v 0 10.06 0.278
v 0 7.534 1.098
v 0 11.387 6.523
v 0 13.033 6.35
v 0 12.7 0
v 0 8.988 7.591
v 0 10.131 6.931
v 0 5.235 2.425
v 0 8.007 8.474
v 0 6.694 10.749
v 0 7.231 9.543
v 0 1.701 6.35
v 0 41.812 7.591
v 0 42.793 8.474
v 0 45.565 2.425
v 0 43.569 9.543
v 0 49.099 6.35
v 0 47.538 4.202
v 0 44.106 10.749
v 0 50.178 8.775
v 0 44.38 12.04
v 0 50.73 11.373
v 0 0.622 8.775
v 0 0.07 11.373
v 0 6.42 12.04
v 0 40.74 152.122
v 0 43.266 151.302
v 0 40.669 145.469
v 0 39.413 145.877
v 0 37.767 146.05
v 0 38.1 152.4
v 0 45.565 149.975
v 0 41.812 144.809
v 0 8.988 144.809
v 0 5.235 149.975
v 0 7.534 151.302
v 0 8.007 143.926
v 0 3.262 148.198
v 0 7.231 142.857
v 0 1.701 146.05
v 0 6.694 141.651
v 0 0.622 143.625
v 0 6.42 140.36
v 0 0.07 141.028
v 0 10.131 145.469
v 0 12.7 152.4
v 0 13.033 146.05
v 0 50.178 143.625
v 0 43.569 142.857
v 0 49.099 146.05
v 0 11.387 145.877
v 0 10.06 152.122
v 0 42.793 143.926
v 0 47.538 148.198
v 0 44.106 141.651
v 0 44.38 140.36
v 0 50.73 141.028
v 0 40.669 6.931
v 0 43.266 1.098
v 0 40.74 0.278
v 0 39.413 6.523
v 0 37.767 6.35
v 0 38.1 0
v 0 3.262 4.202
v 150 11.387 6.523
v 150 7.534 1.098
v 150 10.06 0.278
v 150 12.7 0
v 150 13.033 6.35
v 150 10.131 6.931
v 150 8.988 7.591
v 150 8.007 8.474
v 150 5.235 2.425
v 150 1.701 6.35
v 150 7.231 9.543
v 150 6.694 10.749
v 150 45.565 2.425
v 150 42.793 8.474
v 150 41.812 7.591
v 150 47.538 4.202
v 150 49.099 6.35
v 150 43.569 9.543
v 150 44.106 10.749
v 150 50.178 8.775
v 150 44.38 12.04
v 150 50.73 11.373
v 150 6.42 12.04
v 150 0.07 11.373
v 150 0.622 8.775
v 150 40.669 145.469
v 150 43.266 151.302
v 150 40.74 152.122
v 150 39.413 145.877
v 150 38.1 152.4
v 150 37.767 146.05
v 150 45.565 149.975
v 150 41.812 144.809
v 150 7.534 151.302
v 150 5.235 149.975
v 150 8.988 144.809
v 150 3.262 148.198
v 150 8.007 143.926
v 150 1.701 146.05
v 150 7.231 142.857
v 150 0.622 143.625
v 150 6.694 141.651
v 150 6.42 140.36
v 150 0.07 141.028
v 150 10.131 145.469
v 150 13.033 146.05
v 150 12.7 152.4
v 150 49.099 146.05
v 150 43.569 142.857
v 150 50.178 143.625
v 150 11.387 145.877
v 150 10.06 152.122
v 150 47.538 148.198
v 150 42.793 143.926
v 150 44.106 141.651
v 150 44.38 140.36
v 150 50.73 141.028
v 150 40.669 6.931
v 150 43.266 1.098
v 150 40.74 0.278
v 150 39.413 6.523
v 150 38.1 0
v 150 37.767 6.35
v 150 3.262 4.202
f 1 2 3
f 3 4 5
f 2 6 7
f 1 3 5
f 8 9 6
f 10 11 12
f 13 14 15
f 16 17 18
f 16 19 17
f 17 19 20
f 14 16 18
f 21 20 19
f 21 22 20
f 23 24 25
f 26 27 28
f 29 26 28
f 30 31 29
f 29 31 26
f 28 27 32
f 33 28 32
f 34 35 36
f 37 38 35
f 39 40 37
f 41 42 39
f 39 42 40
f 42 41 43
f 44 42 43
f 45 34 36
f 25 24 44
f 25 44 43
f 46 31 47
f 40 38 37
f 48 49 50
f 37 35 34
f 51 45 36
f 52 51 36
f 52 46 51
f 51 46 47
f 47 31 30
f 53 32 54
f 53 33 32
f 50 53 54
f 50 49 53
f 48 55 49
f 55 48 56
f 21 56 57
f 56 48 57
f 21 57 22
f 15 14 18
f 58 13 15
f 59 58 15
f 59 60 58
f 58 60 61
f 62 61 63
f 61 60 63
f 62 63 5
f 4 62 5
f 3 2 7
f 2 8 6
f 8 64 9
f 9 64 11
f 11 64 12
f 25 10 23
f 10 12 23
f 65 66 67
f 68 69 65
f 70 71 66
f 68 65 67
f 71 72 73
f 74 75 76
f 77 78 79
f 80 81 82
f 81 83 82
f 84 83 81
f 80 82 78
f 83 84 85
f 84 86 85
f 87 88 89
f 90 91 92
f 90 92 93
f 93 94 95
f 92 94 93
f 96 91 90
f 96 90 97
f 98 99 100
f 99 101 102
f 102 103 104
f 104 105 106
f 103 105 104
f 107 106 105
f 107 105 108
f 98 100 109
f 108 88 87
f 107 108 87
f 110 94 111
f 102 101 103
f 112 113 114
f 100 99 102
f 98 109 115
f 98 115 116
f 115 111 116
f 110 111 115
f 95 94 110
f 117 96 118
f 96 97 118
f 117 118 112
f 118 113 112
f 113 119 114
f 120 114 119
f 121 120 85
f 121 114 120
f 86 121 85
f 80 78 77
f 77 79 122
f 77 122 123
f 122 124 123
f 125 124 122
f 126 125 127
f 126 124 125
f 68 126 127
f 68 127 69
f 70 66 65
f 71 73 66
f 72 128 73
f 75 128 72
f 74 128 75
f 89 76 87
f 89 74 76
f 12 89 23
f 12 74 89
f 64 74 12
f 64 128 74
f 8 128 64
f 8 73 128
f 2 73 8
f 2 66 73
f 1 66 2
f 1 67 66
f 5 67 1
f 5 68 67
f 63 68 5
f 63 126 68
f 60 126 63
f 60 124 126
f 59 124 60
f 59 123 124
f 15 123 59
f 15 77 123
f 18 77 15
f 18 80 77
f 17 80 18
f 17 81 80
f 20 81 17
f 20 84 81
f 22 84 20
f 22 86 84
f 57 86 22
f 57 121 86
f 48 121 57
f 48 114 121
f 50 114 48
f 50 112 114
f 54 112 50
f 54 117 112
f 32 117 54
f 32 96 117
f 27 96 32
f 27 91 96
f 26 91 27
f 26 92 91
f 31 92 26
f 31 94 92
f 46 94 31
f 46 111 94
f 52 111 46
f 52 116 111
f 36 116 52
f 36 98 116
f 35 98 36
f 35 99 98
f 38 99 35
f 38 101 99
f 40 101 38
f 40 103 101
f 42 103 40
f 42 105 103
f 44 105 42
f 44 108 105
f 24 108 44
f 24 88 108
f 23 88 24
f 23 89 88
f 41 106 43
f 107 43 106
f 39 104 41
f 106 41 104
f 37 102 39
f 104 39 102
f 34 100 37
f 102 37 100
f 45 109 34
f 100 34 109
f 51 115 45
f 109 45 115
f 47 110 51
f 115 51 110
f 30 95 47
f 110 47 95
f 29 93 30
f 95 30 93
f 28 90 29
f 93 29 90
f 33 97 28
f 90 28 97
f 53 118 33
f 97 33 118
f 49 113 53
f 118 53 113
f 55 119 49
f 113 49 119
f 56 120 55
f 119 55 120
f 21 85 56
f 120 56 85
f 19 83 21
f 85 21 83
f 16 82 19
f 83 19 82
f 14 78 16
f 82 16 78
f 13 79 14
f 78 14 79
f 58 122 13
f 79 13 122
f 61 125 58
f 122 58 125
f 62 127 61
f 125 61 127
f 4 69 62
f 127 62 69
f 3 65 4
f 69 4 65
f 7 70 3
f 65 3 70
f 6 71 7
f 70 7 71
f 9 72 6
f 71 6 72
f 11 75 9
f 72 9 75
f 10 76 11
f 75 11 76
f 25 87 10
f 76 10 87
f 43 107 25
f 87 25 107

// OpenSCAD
// Part T5: Arm Leg Spacer Tube
// Material: 2"×6"×1/4" Rectangular Tubing (50.8mm × 152.4mm × 6.35mm wall)
// Quantity: 2 pieces (1 left, 1 right)
// Location: Elbow section between main arm tube and bucket pivot
//
// This piece is tapered/cut to match the arm plate profile
// Full length before cutting: ~150mm
// Positioned at elbow angle (ARM_ANGLE, typically ~150 degrees)

include <../../lifetrac_v25_params.scad>

// =============================================================================
// PART DIMENSIONS (Pre-cut stock length)
// =============================================================================

_tube_w = is_undef(TUBE_2X6_1_4) ? 152.4 : TUBE_2X6_1_4[0];  // 6 inches
_tube_h = is_undef(TUBE_2X6_1_4) ? 50.8 : TUBE_2X6_1_4[1];   // 2 inches
_wall_thick = 6.35;
_tube_rad = 12.7;

// Spacer length before tapering
PART_T5_LENGTH_STOCK = 150;  // 150mm stock length
PART_T5_WIDTH = _tube_w;
PART_T5_HEIGHT = _tube_h;
PART_T5_WALL = _wall_thick;
PART_T5_RADIUS = _tube_rad;

// Taper parameters from arm geometry
_drop_len = is_undef(ARM_DROP_LEN) ? 300 : ARM_DROP_LEN;
_drop_ext = is_undef(ARM_DROP_EXT) ? 80 : ARM_DROP_EXT;
_pivot_hole_x = is_undef(PIVOT_HOLE_X_FROM_FRONT) ? 25.4 : PIVOT_HOLE_X_FROM_FRONT;
_pivot_hole_z = is_undef(PIVOT_HOLE_Z_FROM_BOTTOM) ? 127 : PIVOT_HOLE_Z_FROM_BOTTOM;

_plate_cx = _drop_ext - _pivot_hole_x;
_boss_x = _drop_len + _plate_cx;
_boss_z = _pivot_hole_z;
_boss_r = _pivot_hole_x;
_cut_start_x = _drop_len - 100;

_bolt_dia = is_undef(BOLT_DIA_1_2) ? 12.7 : BOLT_DIA_1_2;

// =============================================================================
// MAIN MODULE
// =============================================================================

/**
 * Part T5: Arm Leg Spacer Tube (Raw Stock)
 * This shows the uncut stock piece.
 * In fabrication, this will be plasma cut to match arm plate profile.
 * show_profile: if true, shows the cut profile envelope
 */
module _part_t5_arm_leg_spacer_raw() {
    spacer_len = PART_T5_LENGTH_STOCK;
    tube_w = PART_T5_WIDTH;
    tube_h = PART_T5_HEIGHT;
    wall = PART_T5_WALL;
    rad = PART_T5_RADIUS;
    
    color("DarkGray")
    translate([0, 0, tube_h])
    rotate([0, 90, 0])
    linear_extrude(height=spacer_len)
    difference() {
        // Outer profile
        hull() {
            translate([rad, rad]) circle(r=rad);
            translate([tube_h - rad, rad]) circle(r=rad);
            translate([tube_h - rad, tube_w - rad]) circle(r=rad);
            translate([rad, tube_w - rad]) circle(r=rad);
        }
        // Inner cutout
        offset(delta=-wall)
        hull() {
            translate([rad, rad]) circle(r=rad);
            translate([tube_h - rad, rad]) circle(r=rad);
            translate([tube_h - rad, tube_w - rad]) circle(r=rad);
            translate([rad, tube_w - rad]) circle(r=rad);
        }
    }
}

/**
 * Part T5: Arm Leg Spacer Tube (Cut to Profile)
 * Shows the final tapered shape matching arm plate
 * show_holes: if true, renders mounting holes
 */
module _part_t5_arm_leg_spacer_cut(show_holes=true) {
    spacer_len = PART_T5_LENGTH_STOCK;
    tube_w = PART_T5_WIDTH;
    tube_h = PART_T5_HEIGHT;
    wall = PART_T5_WALL;
    rad = PART_T5_RADIUS;
    
    color("DarkGray")
    difference() {
        intersection() {
            // Raw tube section
            translate([0, 0, tube_h])
            rotate([0, 90, 0])
            linear_extrude(height=spacer_len)
            difference() {
                offset(r=rad) square([tube_h - rad*2, tube_w - rad*2], center=true);
                hull() {
                    translate([-tube_h/2 + rad, -tube_w/2 + rad]) circle(r=rad);
                    translate([tube_h/2 - rad, -tube_w/2 + rad]) circle(r=rad);
                    translate([tube_h/2 - rad, tube_w/2 - rad]) circle(r=rad);
                    translate([-tube_h/2 + rad, tube_w/2 - rad]) circle(r=rad);
                }
            }
            
            // Profile envelope (tapers toward pivot)
            union() {
                // Full width portion
                cube([_cut_start_x, 100 + tube_w, tube_h]);
                // Taper portion
                hull() {
                    translate([_cut_start_x - 1, -50, 0])
                    cube([1, 100 + tube_w, tube_h]);
                    translate([_boss_x, -50, _boss_z])
                    rotate([-90, 0, 0])
                    cylinder(r=_boss_r, h=100 + tube_w);
                }
            }
        }
        
        // Mounting holes (4 bolts)
        if (show_holes) {
            for (xb = [spacer_len/3, spacer_len*2/3])
                for (zb = [tube_h*0.3, tube_h*0.7])
                    translate([xb, tube_w/2, zb])
                    rotate([90, 0, 0])
                    cylinder(d=_bolt_dia, h=tube_w + 50, center=true, $fn=32);
        }
    }
}

// =============================================================================
// RENDER
// =============================================================================

// Show the raw stock piece for ordering/cutting
_part_t5_arm_leg_spacer_raw();

// Uncomment to see the cut profile:
// translate([0, 200, 0]) _part_t5_arm_leg_spacer_cut(show_holes=true);

echo("=== PART T5: Arm Leg Spacer Tube ===");
echo("Stock Length:", PART_T5_LENGTH_STOCK, "mm (", PART_T5_LENGTH_STOCK/25.4, "in)");
echo("Width (6\" face):", PART_T5_WIDTH, "mm");
echo("Height (2\" face):", PART_T5_HEIGHT, "mm");
echo("Wall thickness:", PART_T5_WALL, "mm");
echo("Note: Cut to profile matching arm_plate.scad taper");
echo("Mounting holes: 8 total (1/2\" dia, through-tube)");
echo("Quantity needed: 2 pieces (left and right arms)");
